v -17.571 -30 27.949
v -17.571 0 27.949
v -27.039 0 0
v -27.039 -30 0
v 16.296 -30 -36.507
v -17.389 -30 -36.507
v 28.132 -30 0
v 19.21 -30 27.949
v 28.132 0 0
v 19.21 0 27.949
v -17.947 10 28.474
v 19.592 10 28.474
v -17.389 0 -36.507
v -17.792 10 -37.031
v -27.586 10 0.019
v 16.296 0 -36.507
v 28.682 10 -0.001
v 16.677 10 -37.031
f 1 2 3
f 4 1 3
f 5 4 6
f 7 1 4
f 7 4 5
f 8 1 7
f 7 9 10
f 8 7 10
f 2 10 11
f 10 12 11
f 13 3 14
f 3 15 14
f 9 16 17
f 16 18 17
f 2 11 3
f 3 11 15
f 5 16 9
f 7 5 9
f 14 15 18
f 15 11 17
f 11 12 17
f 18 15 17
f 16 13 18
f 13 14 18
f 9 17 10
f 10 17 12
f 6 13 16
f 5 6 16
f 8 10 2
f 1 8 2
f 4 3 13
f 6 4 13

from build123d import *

# Parameters (mm, degrees)
F1_DEPTH      = 30
F1_DEPTH_BACK = 10
F1_TAPER_BACK = -3


with BuildPart() as f1:
    # F0 (on Front) → F1 (new body, two sides)
    with BuildSketch(Plane.XZ) as f1_sk:
        Polygon((-17.5708103925, 27.9494225979), (-27.0390175283, 0), (-17.3887293786, -36.5072265267), (0, -36.5072265267), (16.2962432951, -36.5072265267), (28.1315054744, 0), (19.2095395178, 27.9494225979), align=None)
    extrude(amount=F1_DEPTH)
    extrude(f1_sk.sketch, amount=-F1_DEPTH_BACK, taper=F1_TAPER_BACK)


solid = f1.part
